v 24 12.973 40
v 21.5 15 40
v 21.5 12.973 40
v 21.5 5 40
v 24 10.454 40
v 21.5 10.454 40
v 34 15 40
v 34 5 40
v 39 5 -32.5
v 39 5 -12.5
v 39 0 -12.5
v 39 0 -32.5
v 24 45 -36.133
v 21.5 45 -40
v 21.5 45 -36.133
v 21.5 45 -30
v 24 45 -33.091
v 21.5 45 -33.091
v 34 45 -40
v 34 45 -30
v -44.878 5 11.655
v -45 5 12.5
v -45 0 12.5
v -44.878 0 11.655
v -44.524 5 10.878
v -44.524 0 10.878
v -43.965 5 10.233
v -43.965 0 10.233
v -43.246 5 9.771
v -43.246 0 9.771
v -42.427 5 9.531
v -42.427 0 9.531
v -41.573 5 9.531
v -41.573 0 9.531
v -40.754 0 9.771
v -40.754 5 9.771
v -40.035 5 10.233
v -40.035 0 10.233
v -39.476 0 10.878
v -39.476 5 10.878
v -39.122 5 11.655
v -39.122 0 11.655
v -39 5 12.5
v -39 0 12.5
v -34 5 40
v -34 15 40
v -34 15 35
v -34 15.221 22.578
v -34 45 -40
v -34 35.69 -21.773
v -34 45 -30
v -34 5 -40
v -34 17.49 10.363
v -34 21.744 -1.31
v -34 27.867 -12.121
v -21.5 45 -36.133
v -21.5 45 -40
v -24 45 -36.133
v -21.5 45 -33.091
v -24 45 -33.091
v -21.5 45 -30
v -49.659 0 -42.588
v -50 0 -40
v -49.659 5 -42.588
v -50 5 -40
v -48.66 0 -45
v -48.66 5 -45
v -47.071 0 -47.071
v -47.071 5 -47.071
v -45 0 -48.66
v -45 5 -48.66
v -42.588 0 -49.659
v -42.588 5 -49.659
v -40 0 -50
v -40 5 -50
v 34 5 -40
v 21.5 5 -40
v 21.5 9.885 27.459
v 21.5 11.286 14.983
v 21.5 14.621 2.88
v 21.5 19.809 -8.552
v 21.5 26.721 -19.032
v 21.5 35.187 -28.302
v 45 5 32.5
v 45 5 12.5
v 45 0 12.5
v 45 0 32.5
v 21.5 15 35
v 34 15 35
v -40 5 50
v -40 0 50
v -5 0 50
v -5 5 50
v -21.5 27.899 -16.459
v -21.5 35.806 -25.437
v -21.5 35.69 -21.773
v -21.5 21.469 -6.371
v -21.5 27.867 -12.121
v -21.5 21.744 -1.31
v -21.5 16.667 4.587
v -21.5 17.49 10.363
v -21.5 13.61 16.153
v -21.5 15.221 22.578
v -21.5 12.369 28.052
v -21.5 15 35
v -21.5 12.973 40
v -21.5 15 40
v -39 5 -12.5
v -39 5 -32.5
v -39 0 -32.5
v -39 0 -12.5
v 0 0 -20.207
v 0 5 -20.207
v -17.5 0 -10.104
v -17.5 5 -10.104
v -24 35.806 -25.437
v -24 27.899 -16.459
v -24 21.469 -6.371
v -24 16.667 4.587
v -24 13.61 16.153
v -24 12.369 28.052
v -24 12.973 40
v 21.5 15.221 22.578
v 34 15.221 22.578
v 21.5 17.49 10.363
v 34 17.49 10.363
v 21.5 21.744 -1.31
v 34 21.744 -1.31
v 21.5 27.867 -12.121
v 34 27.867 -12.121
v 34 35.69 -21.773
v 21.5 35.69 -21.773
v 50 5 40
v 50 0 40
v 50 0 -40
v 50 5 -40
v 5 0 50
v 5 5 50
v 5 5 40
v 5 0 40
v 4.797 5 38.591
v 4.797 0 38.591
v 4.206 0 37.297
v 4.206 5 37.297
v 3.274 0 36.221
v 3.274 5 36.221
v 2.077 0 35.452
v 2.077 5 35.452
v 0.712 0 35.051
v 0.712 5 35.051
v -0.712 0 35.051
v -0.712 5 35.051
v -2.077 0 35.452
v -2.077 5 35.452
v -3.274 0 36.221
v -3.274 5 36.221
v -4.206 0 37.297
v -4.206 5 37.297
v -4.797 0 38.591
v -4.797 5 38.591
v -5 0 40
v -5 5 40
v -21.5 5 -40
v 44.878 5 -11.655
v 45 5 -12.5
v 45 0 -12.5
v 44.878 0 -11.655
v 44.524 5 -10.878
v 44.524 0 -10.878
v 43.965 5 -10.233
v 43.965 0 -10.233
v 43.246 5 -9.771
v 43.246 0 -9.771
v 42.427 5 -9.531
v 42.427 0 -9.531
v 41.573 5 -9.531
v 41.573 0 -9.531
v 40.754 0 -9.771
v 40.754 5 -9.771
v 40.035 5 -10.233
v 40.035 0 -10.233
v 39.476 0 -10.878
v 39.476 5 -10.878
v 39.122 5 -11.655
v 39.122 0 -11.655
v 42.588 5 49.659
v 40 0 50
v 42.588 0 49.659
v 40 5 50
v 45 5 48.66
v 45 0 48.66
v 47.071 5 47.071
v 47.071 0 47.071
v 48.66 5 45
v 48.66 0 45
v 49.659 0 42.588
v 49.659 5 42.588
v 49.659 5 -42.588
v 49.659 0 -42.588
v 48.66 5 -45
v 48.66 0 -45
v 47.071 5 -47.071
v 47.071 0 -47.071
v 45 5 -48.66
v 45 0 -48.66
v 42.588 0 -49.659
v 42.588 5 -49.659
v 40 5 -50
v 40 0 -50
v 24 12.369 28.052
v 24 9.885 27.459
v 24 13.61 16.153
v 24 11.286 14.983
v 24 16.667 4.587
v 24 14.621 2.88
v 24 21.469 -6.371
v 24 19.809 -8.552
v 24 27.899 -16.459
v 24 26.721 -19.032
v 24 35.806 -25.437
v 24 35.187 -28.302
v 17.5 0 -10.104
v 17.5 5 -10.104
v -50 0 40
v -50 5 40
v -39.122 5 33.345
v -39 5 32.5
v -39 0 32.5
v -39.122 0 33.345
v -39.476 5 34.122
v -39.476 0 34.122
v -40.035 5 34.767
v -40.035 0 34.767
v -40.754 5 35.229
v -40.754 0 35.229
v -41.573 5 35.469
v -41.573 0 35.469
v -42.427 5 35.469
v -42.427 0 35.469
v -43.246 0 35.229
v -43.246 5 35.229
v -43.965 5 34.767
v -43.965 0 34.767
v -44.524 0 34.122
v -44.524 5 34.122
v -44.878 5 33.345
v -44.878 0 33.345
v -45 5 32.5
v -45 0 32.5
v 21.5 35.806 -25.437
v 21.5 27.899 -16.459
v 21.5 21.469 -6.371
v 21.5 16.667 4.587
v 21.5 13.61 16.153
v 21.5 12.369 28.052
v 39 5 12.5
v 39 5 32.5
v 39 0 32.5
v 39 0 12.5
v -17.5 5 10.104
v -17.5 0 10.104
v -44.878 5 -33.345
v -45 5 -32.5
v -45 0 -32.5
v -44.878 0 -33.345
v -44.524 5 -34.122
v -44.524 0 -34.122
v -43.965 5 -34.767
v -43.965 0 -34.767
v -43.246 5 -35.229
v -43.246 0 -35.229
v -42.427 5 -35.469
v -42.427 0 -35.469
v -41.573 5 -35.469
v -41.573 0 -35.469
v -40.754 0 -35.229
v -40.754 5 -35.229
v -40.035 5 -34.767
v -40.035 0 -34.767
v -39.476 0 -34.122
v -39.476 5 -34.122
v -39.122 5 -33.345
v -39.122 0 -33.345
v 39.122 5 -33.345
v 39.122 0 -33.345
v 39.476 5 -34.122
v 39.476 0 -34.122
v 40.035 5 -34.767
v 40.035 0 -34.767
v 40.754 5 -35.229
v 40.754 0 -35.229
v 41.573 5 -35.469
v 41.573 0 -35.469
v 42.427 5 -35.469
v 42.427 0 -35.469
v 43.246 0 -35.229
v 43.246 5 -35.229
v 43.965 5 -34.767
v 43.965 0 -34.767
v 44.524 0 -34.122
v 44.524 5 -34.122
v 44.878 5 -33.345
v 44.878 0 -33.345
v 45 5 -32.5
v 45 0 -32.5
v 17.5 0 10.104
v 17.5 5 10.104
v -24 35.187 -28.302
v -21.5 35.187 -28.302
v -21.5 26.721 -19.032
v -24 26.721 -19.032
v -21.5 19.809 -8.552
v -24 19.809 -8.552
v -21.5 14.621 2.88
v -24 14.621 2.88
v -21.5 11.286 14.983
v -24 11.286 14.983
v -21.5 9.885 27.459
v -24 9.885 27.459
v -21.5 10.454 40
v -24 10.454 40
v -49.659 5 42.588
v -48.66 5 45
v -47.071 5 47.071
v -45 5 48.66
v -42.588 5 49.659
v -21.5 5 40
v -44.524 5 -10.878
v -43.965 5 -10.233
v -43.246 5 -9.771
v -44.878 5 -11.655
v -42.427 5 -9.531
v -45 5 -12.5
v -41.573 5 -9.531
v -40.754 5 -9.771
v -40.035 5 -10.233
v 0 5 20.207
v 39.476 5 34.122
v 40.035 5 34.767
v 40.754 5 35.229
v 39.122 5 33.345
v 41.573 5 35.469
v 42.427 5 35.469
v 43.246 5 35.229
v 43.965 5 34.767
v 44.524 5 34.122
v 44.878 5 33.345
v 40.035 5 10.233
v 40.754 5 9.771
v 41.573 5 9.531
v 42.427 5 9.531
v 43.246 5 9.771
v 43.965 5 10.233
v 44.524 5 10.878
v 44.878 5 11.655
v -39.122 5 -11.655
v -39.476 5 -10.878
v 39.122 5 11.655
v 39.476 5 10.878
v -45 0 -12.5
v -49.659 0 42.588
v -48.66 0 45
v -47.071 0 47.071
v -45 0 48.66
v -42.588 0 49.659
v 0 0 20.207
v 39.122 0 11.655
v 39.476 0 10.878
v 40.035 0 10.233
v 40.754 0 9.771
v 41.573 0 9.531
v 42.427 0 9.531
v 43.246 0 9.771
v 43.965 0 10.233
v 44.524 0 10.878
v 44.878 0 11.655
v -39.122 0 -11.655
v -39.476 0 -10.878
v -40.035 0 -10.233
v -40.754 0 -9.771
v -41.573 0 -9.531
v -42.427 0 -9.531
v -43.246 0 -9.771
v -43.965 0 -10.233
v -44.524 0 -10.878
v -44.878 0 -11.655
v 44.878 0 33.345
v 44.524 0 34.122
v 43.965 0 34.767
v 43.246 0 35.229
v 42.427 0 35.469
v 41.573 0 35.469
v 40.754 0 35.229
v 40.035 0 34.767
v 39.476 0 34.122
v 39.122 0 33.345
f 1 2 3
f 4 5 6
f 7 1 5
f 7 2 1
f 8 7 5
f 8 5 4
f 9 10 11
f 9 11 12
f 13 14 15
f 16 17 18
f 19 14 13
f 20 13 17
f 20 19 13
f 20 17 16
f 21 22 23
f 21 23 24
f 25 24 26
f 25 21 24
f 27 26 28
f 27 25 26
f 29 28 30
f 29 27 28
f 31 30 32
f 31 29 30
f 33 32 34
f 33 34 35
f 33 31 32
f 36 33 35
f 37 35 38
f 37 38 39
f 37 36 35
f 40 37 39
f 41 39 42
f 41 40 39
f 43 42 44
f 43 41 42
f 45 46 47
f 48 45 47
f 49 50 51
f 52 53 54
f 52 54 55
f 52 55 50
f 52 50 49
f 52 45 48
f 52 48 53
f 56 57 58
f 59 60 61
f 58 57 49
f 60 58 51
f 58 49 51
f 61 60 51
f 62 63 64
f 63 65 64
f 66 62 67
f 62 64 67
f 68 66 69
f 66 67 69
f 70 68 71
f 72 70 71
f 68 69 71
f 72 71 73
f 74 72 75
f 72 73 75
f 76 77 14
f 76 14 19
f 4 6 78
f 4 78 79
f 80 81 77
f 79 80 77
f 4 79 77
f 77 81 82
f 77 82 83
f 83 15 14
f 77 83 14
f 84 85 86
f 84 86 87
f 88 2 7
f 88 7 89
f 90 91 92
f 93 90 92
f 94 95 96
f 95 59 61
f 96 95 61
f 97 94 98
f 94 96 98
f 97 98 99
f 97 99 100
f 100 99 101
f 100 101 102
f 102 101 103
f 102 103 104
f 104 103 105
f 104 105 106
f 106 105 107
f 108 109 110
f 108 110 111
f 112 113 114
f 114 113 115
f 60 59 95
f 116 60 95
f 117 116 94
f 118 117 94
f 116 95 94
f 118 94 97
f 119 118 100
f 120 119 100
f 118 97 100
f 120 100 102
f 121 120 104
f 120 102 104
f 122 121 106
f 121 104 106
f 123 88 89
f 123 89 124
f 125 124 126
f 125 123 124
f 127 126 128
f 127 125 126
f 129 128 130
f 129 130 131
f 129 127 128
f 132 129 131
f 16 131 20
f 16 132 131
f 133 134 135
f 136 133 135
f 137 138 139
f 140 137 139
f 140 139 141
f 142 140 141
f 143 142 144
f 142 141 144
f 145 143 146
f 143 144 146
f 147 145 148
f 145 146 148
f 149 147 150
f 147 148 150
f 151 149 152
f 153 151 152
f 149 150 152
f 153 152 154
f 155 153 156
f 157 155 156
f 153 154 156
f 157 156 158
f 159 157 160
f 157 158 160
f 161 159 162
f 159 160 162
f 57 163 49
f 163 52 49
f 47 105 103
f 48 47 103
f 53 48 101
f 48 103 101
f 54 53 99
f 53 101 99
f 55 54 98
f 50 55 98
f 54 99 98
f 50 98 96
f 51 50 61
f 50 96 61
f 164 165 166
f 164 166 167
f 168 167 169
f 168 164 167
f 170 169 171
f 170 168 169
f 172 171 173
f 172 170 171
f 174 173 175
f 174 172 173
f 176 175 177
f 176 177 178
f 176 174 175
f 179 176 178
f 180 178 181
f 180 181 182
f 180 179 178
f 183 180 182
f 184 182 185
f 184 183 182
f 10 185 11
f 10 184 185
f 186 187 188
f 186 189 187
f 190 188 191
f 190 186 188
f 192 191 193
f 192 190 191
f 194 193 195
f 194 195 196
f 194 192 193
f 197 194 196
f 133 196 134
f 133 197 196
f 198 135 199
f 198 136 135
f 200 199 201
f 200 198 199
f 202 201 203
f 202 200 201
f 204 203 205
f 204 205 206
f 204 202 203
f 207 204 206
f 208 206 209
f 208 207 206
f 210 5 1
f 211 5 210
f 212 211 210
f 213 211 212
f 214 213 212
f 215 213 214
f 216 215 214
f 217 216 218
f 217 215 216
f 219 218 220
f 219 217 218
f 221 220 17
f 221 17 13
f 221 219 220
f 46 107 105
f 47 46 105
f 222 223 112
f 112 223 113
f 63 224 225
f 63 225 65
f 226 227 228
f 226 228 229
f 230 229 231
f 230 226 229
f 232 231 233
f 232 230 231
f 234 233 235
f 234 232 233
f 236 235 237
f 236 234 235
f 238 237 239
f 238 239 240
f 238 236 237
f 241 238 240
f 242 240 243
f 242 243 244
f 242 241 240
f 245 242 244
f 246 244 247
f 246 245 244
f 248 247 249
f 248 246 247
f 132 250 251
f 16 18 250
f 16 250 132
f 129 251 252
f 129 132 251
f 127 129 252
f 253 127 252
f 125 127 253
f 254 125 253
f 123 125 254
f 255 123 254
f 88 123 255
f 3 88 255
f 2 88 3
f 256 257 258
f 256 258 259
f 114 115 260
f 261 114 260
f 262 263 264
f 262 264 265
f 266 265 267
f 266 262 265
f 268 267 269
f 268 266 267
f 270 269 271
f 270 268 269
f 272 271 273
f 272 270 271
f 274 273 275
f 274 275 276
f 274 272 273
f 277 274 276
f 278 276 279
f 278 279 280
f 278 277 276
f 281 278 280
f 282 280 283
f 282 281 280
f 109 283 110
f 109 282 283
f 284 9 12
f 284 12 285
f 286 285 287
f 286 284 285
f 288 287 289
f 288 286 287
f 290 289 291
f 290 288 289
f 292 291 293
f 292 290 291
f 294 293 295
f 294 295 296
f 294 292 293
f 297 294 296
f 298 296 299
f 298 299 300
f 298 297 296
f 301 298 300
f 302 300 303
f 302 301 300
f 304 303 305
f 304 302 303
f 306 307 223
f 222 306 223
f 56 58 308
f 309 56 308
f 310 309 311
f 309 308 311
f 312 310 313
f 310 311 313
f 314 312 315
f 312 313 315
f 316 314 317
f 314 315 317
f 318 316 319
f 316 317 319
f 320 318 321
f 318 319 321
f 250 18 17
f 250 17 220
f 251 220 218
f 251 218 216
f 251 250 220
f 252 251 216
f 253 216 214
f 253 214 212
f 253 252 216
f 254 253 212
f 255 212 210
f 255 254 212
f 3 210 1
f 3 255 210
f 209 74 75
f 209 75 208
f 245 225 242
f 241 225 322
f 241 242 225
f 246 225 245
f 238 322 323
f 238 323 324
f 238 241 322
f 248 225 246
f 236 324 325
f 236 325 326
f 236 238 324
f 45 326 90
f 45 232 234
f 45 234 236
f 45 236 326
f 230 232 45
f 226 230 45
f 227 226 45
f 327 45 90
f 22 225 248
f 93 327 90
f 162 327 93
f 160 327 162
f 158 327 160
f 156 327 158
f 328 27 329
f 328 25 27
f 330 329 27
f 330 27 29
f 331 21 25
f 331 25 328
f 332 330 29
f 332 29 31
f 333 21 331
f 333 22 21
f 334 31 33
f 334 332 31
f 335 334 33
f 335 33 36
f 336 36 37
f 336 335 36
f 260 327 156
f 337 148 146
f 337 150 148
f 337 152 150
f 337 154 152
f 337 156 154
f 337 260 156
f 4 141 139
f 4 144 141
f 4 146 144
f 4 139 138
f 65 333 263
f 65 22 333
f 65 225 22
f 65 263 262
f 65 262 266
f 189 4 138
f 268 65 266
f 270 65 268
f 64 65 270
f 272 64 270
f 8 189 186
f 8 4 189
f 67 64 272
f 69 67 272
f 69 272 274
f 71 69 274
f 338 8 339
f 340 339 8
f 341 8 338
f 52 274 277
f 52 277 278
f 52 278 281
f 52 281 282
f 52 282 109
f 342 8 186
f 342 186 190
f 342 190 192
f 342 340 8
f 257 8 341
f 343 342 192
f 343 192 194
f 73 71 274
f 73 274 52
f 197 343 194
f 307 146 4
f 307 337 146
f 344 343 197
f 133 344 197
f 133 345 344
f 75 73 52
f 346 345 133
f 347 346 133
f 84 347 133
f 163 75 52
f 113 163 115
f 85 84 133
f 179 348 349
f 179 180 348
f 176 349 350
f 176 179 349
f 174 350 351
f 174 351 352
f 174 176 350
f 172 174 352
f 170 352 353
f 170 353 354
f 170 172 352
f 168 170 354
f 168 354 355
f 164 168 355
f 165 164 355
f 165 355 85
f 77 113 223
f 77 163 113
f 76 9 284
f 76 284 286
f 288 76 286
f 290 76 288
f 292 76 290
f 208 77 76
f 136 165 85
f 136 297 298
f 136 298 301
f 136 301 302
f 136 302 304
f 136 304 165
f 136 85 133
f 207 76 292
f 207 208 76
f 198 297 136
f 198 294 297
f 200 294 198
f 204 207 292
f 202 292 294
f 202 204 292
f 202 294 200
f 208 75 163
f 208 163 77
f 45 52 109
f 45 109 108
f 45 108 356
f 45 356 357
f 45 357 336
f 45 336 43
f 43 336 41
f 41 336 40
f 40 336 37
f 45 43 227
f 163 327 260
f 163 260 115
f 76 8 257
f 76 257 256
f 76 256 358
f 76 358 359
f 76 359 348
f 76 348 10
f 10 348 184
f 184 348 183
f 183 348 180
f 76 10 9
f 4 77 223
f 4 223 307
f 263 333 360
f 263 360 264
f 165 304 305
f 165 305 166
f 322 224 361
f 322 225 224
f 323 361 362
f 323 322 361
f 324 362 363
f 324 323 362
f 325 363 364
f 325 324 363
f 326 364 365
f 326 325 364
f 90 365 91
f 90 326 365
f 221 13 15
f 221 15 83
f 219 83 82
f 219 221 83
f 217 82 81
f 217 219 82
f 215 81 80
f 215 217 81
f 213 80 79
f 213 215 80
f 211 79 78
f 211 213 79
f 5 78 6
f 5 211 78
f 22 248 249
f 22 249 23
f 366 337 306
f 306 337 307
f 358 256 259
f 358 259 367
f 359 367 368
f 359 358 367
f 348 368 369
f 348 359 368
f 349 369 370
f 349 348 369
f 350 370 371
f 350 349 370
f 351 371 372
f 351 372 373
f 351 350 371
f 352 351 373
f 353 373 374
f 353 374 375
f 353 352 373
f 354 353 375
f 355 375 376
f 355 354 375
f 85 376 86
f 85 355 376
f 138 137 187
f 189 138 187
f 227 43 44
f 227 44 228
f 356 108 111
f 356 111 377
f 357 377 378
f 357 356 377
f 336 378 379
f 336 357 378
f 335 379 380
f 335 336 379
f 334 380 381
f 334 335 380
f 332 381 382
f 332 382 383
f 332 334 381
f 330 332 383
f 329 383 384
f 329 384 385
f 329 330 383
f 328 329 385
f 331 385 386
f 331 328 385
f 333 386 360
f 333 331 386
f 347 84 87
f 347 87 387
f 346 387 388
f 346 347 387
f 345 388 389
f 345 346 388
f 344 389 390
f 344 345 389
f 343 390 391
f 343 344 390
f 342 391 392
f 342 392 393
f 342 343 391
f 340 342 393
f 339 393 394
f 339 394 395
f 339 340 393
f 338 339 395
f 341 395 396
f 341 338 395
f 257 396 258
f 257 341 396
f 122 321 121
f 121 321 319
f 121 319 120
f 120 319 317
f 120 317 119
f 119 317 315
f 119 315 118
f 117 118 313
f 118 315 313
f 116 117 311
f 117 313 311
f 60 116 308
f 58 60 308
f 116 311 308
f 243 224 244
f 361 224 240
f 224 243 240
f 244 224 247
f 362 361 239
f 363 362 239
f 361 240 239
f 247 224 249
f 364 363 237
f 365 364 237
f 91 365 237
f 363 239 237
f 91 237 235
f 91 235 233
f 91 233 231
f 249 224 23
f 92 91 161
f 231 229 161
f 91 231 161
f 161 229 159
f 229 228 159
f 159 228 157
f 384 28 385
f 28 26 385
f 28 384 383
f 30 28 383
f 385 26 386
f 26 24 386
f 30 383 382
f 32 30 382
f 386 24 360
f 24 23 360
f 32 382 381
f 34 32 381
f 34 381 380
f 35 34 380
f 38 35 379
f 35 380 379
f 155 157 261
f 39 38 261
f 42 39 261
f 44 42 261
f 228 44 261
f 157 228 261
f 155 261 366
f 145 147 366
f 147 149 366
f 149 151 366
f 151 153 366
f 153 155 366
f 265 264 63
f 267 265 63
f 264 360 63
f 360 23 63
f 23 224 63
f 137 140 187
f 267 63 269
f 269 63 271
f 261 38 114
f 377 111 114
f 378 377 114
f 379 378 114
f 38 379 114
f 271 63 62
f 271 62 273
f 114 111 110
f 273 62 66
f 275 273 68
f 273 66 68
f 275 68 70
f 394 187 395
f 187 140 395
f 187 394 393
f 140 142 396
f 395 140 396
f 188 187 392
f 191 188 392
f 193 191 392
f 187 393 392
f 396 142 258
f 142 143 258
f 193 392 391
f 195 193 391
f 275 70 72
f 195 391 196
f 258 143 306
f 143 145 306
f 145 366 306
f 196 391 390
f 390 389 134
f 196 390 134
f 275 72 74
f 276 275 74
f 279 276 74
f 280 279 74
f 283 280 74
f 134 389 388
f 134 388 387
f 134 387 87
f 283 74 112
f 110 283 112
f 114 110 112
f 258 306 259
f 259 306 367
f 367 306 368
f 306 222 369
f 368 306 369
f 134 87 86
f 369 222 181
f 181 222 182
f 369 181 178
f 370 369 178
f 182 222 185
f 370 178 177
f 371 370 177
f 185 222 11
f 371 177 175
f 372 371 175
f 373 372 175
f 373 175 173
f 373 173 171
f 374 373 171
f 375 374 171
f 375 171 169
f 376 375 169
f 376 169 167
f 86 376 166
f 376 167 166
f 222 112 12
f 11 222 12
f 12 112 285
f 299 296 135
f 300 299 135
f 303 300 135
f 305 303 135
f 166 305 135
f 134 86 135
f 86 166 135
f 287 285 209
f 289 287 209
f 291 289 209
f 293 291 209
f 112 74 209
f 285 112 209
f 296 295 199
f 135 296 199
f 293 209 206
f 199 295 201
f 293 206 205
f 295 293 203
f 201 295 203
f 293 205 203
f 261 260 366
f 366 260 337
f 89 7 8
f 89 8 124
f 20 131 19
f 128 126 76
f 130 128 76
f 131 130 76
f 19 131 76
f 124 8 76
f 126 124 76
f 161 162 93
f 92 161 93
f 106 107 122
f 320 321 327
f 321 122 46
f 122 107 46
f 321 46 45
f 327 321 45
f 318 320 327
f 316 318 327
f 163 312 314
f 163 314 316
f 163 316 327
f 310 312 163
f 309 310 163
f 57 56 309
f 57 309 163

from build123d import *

# Parameters (mm, degrees)
CROQUIS2_W              = 100
CROQUIS2_H              = 100
SALIENTE_EXTRUIR1_DEPTH = 5
REDONDEO1_R             = 10
CORTAR_EXTRUIR1_DEPTH   = 5
CROQUIS4_W              = 10
CROQUIS4_H              = 80
SALIENTE_EXTRUIR2_DEPTH = 40
CORTAR_EXTRUIR2_DEPTH   = 84
SALIENTE_EXTRUIR4_START = 2.5
SALIENTE_EXTRUIR4_DEPTH = 2.5
SALIENTE_EXTRUIR5_DEPTH = 2.5


with BuildPart() as part:
    # Croquis2 → Saliente-Extruir1 (new body)
    with BuildSketch(Plane(origin=(0, 0, 0), x_dir=(1, 0, 0), z_dir=(0, 1, 0))):
        Rectangle(CROQUIS2_W, CROQUIS2_H)
    extrude(amount=SALIENTE_EXTRUIR1_DEPTH)

    # Redondeo1
    redondeo1_edges = [part.edges().sort_by_distance(p)[0] for p in [
        (-50, 2.5, -50),
        (50, 2.5, -50),
        (50, 2.5, 50),
        (-50, 2.5, 50),
    ]]
    fillet(redondeo1_edges, radius=REDONDEO1_R)

    # Croquis3 → Cortar-Extruir1 (cut)
    with BuildSketch(Plane(origin=(0, 5, 0), x_dir=(1, 0, 0), z_dir=(0, 1, 0))):
        with BuildLine():
            Line((-5, -50), (5, -50))
            Line((5, -50), (5, -40))
            ThreePointArc((5, -40), (0, -35), (-5, -40))
            Line((-5, -40), (-5, -50))
        make_face()
        with BuildLine():
            Line((-39, 32.5), (-39, 12.5))
            ThreePointArc((-39, 12.5), (-42, 9.5), (-45, 12.5))
            Line((-45, 12.5), (-45, 32.5))
            ThreePointArc((-45, 32.5), (-42, 35.5), (-39, 32.5))
        make_face()
        with BuildLine():
            Line((45, 32.5), (45, 12.5))
            ThreePointArc((45, 12.5), (42, 9.5), (39, 12.5))
            Line((39, 12.5), (39, 32.5))
            ThreePointArc((39, 32.5), (42, 35.5), (45, 32.5))
        make_face()
        with BuildLine():
            Line((-39, -12.5), (-39, -32.5))
            ThreePointArc((-39, -32.5), (-42, -35.5), (-45, -32.5))
            Line((-45, -32.5), (-45, -12.5))
            ThreePointArc((-45, -12.5), (-42, -9.5), (-39, -12.5))
        make_face()
        with BuildLine():
            Line((45, -12.5), (45, -32.5))
            ThreePointArc((45, -32.5), (42, -35.5), (39, -32.5))
            Line((39, -32.5), (39, -12.5))
            ThreePointArc((39, -12.5), (42, -9.5), (45, -12.5))
        make_face()
        Polygon((0, 20.207259422), (-17.5, 10.103629711), (-17.5, -10.103629711), (0, -20.207259422), (17.5, -10.103629711), (17.5, 10.103629711), align=None)
    extrude(amount=-CORTAR_EXTRUIR1_DEPTH, mode=Mode.SUBTRACT)

    # Croquis4 → Saliente-Extruir2 (add)
    with BuildSketch(Plane(origin=(0, 5, 0), x_dir=(1, 0, 0), z_dir=(0, 1, 0))):
        with Locations((-29, 0)):
            Rectangle(CROQUIS4_W, CROQUIS4_H)
        with Locations((29, 0)):
            Rectangle(CROQUIS4_W, CROQUIS4_H)
    extrude(amount=SALIENTE_EXTRUIR2_DEPTH)

    # Croquis5 → Cortar-Extruir2 (cut)
    with BuildSketch(Plane(origin=(34, 0, 0), x_dir=(0, 0, -1), z_dir=(1, 0, 0))):
        with BuildLine():
            Line((-40, 15), (-35, 15))
            ThreePointArc((-35, 15), (1.310440846, 21.744044834), (30, 45))
            Line((30, 45), (-40, 45))
            Line((-40, 45), (-40, 15))
        make_face()
    extrude(amount=-CORTAR_EXTRUIR2_DEPTH, mode=Mode.SUBTRACT)

    # Croquis8 → Saliente-Extruir4 (add)
    with BuildSketch(Plane(origin=(-24, 0, 0), x_dir=(0, 0, -1), z_dir=(1, 0, 0)).offset(SALIENTE_EXTRUIR4_START)):
        with BuildLine():
            Line((-40, 12.973487285), (-40, 15))
            Line((-40, 15), (-35, 15))
            ThreePointArc((-35, 15), (1.310440846, 21.744044834), (30, 45))
            Line((30, 45), (33.091320679, 45))
            ThreePointArc((33.091320679, 45), (0.984523571, 18.856312683), (-40, 12.973487285))
        make_face()
    saliente_extruir4 = extrude(amount=-SALIENTE_EXTRUIR4_DEPTH)

    # Croquis9 → Saliente-Extruir5 (add)
    with BuildSketch(Plane(origin=(-24, 0, 0), x_dir=(0, 0, -1), z_dir=(1, 0, 0))):
        with BuildLine():
            Line((-40, 10.453567004), (-40, 5))
            Line((-40, 5), (40, 5))
            Line((40, 5), (40, 45))
            Line((40, 45), (36.132755539, 45))
            ThreePointArc((36.132755539, 45), (2.938227405, 16.990296255), (-40, 10.453567004))
        make_face()
    saliente_extruir5 = extrude(amount=SALIENTE_EXTRUIR5_DEPTH)

    # Simetría1: Saliente-Extruir4, Saliente-Extruir5 across plane
    add(saliente_extruir4.mirror(Plane(origin=(0, 0, 0), x_dir=(0, 0, 1), z_dir=(1, 0, 0))))
    add(saliente_extruir5.mirror(Plane(origin=(0, 0, 0), x_dir=(0, 0, 1), z_dir=(1, 0, 0))))


solid = part.part
